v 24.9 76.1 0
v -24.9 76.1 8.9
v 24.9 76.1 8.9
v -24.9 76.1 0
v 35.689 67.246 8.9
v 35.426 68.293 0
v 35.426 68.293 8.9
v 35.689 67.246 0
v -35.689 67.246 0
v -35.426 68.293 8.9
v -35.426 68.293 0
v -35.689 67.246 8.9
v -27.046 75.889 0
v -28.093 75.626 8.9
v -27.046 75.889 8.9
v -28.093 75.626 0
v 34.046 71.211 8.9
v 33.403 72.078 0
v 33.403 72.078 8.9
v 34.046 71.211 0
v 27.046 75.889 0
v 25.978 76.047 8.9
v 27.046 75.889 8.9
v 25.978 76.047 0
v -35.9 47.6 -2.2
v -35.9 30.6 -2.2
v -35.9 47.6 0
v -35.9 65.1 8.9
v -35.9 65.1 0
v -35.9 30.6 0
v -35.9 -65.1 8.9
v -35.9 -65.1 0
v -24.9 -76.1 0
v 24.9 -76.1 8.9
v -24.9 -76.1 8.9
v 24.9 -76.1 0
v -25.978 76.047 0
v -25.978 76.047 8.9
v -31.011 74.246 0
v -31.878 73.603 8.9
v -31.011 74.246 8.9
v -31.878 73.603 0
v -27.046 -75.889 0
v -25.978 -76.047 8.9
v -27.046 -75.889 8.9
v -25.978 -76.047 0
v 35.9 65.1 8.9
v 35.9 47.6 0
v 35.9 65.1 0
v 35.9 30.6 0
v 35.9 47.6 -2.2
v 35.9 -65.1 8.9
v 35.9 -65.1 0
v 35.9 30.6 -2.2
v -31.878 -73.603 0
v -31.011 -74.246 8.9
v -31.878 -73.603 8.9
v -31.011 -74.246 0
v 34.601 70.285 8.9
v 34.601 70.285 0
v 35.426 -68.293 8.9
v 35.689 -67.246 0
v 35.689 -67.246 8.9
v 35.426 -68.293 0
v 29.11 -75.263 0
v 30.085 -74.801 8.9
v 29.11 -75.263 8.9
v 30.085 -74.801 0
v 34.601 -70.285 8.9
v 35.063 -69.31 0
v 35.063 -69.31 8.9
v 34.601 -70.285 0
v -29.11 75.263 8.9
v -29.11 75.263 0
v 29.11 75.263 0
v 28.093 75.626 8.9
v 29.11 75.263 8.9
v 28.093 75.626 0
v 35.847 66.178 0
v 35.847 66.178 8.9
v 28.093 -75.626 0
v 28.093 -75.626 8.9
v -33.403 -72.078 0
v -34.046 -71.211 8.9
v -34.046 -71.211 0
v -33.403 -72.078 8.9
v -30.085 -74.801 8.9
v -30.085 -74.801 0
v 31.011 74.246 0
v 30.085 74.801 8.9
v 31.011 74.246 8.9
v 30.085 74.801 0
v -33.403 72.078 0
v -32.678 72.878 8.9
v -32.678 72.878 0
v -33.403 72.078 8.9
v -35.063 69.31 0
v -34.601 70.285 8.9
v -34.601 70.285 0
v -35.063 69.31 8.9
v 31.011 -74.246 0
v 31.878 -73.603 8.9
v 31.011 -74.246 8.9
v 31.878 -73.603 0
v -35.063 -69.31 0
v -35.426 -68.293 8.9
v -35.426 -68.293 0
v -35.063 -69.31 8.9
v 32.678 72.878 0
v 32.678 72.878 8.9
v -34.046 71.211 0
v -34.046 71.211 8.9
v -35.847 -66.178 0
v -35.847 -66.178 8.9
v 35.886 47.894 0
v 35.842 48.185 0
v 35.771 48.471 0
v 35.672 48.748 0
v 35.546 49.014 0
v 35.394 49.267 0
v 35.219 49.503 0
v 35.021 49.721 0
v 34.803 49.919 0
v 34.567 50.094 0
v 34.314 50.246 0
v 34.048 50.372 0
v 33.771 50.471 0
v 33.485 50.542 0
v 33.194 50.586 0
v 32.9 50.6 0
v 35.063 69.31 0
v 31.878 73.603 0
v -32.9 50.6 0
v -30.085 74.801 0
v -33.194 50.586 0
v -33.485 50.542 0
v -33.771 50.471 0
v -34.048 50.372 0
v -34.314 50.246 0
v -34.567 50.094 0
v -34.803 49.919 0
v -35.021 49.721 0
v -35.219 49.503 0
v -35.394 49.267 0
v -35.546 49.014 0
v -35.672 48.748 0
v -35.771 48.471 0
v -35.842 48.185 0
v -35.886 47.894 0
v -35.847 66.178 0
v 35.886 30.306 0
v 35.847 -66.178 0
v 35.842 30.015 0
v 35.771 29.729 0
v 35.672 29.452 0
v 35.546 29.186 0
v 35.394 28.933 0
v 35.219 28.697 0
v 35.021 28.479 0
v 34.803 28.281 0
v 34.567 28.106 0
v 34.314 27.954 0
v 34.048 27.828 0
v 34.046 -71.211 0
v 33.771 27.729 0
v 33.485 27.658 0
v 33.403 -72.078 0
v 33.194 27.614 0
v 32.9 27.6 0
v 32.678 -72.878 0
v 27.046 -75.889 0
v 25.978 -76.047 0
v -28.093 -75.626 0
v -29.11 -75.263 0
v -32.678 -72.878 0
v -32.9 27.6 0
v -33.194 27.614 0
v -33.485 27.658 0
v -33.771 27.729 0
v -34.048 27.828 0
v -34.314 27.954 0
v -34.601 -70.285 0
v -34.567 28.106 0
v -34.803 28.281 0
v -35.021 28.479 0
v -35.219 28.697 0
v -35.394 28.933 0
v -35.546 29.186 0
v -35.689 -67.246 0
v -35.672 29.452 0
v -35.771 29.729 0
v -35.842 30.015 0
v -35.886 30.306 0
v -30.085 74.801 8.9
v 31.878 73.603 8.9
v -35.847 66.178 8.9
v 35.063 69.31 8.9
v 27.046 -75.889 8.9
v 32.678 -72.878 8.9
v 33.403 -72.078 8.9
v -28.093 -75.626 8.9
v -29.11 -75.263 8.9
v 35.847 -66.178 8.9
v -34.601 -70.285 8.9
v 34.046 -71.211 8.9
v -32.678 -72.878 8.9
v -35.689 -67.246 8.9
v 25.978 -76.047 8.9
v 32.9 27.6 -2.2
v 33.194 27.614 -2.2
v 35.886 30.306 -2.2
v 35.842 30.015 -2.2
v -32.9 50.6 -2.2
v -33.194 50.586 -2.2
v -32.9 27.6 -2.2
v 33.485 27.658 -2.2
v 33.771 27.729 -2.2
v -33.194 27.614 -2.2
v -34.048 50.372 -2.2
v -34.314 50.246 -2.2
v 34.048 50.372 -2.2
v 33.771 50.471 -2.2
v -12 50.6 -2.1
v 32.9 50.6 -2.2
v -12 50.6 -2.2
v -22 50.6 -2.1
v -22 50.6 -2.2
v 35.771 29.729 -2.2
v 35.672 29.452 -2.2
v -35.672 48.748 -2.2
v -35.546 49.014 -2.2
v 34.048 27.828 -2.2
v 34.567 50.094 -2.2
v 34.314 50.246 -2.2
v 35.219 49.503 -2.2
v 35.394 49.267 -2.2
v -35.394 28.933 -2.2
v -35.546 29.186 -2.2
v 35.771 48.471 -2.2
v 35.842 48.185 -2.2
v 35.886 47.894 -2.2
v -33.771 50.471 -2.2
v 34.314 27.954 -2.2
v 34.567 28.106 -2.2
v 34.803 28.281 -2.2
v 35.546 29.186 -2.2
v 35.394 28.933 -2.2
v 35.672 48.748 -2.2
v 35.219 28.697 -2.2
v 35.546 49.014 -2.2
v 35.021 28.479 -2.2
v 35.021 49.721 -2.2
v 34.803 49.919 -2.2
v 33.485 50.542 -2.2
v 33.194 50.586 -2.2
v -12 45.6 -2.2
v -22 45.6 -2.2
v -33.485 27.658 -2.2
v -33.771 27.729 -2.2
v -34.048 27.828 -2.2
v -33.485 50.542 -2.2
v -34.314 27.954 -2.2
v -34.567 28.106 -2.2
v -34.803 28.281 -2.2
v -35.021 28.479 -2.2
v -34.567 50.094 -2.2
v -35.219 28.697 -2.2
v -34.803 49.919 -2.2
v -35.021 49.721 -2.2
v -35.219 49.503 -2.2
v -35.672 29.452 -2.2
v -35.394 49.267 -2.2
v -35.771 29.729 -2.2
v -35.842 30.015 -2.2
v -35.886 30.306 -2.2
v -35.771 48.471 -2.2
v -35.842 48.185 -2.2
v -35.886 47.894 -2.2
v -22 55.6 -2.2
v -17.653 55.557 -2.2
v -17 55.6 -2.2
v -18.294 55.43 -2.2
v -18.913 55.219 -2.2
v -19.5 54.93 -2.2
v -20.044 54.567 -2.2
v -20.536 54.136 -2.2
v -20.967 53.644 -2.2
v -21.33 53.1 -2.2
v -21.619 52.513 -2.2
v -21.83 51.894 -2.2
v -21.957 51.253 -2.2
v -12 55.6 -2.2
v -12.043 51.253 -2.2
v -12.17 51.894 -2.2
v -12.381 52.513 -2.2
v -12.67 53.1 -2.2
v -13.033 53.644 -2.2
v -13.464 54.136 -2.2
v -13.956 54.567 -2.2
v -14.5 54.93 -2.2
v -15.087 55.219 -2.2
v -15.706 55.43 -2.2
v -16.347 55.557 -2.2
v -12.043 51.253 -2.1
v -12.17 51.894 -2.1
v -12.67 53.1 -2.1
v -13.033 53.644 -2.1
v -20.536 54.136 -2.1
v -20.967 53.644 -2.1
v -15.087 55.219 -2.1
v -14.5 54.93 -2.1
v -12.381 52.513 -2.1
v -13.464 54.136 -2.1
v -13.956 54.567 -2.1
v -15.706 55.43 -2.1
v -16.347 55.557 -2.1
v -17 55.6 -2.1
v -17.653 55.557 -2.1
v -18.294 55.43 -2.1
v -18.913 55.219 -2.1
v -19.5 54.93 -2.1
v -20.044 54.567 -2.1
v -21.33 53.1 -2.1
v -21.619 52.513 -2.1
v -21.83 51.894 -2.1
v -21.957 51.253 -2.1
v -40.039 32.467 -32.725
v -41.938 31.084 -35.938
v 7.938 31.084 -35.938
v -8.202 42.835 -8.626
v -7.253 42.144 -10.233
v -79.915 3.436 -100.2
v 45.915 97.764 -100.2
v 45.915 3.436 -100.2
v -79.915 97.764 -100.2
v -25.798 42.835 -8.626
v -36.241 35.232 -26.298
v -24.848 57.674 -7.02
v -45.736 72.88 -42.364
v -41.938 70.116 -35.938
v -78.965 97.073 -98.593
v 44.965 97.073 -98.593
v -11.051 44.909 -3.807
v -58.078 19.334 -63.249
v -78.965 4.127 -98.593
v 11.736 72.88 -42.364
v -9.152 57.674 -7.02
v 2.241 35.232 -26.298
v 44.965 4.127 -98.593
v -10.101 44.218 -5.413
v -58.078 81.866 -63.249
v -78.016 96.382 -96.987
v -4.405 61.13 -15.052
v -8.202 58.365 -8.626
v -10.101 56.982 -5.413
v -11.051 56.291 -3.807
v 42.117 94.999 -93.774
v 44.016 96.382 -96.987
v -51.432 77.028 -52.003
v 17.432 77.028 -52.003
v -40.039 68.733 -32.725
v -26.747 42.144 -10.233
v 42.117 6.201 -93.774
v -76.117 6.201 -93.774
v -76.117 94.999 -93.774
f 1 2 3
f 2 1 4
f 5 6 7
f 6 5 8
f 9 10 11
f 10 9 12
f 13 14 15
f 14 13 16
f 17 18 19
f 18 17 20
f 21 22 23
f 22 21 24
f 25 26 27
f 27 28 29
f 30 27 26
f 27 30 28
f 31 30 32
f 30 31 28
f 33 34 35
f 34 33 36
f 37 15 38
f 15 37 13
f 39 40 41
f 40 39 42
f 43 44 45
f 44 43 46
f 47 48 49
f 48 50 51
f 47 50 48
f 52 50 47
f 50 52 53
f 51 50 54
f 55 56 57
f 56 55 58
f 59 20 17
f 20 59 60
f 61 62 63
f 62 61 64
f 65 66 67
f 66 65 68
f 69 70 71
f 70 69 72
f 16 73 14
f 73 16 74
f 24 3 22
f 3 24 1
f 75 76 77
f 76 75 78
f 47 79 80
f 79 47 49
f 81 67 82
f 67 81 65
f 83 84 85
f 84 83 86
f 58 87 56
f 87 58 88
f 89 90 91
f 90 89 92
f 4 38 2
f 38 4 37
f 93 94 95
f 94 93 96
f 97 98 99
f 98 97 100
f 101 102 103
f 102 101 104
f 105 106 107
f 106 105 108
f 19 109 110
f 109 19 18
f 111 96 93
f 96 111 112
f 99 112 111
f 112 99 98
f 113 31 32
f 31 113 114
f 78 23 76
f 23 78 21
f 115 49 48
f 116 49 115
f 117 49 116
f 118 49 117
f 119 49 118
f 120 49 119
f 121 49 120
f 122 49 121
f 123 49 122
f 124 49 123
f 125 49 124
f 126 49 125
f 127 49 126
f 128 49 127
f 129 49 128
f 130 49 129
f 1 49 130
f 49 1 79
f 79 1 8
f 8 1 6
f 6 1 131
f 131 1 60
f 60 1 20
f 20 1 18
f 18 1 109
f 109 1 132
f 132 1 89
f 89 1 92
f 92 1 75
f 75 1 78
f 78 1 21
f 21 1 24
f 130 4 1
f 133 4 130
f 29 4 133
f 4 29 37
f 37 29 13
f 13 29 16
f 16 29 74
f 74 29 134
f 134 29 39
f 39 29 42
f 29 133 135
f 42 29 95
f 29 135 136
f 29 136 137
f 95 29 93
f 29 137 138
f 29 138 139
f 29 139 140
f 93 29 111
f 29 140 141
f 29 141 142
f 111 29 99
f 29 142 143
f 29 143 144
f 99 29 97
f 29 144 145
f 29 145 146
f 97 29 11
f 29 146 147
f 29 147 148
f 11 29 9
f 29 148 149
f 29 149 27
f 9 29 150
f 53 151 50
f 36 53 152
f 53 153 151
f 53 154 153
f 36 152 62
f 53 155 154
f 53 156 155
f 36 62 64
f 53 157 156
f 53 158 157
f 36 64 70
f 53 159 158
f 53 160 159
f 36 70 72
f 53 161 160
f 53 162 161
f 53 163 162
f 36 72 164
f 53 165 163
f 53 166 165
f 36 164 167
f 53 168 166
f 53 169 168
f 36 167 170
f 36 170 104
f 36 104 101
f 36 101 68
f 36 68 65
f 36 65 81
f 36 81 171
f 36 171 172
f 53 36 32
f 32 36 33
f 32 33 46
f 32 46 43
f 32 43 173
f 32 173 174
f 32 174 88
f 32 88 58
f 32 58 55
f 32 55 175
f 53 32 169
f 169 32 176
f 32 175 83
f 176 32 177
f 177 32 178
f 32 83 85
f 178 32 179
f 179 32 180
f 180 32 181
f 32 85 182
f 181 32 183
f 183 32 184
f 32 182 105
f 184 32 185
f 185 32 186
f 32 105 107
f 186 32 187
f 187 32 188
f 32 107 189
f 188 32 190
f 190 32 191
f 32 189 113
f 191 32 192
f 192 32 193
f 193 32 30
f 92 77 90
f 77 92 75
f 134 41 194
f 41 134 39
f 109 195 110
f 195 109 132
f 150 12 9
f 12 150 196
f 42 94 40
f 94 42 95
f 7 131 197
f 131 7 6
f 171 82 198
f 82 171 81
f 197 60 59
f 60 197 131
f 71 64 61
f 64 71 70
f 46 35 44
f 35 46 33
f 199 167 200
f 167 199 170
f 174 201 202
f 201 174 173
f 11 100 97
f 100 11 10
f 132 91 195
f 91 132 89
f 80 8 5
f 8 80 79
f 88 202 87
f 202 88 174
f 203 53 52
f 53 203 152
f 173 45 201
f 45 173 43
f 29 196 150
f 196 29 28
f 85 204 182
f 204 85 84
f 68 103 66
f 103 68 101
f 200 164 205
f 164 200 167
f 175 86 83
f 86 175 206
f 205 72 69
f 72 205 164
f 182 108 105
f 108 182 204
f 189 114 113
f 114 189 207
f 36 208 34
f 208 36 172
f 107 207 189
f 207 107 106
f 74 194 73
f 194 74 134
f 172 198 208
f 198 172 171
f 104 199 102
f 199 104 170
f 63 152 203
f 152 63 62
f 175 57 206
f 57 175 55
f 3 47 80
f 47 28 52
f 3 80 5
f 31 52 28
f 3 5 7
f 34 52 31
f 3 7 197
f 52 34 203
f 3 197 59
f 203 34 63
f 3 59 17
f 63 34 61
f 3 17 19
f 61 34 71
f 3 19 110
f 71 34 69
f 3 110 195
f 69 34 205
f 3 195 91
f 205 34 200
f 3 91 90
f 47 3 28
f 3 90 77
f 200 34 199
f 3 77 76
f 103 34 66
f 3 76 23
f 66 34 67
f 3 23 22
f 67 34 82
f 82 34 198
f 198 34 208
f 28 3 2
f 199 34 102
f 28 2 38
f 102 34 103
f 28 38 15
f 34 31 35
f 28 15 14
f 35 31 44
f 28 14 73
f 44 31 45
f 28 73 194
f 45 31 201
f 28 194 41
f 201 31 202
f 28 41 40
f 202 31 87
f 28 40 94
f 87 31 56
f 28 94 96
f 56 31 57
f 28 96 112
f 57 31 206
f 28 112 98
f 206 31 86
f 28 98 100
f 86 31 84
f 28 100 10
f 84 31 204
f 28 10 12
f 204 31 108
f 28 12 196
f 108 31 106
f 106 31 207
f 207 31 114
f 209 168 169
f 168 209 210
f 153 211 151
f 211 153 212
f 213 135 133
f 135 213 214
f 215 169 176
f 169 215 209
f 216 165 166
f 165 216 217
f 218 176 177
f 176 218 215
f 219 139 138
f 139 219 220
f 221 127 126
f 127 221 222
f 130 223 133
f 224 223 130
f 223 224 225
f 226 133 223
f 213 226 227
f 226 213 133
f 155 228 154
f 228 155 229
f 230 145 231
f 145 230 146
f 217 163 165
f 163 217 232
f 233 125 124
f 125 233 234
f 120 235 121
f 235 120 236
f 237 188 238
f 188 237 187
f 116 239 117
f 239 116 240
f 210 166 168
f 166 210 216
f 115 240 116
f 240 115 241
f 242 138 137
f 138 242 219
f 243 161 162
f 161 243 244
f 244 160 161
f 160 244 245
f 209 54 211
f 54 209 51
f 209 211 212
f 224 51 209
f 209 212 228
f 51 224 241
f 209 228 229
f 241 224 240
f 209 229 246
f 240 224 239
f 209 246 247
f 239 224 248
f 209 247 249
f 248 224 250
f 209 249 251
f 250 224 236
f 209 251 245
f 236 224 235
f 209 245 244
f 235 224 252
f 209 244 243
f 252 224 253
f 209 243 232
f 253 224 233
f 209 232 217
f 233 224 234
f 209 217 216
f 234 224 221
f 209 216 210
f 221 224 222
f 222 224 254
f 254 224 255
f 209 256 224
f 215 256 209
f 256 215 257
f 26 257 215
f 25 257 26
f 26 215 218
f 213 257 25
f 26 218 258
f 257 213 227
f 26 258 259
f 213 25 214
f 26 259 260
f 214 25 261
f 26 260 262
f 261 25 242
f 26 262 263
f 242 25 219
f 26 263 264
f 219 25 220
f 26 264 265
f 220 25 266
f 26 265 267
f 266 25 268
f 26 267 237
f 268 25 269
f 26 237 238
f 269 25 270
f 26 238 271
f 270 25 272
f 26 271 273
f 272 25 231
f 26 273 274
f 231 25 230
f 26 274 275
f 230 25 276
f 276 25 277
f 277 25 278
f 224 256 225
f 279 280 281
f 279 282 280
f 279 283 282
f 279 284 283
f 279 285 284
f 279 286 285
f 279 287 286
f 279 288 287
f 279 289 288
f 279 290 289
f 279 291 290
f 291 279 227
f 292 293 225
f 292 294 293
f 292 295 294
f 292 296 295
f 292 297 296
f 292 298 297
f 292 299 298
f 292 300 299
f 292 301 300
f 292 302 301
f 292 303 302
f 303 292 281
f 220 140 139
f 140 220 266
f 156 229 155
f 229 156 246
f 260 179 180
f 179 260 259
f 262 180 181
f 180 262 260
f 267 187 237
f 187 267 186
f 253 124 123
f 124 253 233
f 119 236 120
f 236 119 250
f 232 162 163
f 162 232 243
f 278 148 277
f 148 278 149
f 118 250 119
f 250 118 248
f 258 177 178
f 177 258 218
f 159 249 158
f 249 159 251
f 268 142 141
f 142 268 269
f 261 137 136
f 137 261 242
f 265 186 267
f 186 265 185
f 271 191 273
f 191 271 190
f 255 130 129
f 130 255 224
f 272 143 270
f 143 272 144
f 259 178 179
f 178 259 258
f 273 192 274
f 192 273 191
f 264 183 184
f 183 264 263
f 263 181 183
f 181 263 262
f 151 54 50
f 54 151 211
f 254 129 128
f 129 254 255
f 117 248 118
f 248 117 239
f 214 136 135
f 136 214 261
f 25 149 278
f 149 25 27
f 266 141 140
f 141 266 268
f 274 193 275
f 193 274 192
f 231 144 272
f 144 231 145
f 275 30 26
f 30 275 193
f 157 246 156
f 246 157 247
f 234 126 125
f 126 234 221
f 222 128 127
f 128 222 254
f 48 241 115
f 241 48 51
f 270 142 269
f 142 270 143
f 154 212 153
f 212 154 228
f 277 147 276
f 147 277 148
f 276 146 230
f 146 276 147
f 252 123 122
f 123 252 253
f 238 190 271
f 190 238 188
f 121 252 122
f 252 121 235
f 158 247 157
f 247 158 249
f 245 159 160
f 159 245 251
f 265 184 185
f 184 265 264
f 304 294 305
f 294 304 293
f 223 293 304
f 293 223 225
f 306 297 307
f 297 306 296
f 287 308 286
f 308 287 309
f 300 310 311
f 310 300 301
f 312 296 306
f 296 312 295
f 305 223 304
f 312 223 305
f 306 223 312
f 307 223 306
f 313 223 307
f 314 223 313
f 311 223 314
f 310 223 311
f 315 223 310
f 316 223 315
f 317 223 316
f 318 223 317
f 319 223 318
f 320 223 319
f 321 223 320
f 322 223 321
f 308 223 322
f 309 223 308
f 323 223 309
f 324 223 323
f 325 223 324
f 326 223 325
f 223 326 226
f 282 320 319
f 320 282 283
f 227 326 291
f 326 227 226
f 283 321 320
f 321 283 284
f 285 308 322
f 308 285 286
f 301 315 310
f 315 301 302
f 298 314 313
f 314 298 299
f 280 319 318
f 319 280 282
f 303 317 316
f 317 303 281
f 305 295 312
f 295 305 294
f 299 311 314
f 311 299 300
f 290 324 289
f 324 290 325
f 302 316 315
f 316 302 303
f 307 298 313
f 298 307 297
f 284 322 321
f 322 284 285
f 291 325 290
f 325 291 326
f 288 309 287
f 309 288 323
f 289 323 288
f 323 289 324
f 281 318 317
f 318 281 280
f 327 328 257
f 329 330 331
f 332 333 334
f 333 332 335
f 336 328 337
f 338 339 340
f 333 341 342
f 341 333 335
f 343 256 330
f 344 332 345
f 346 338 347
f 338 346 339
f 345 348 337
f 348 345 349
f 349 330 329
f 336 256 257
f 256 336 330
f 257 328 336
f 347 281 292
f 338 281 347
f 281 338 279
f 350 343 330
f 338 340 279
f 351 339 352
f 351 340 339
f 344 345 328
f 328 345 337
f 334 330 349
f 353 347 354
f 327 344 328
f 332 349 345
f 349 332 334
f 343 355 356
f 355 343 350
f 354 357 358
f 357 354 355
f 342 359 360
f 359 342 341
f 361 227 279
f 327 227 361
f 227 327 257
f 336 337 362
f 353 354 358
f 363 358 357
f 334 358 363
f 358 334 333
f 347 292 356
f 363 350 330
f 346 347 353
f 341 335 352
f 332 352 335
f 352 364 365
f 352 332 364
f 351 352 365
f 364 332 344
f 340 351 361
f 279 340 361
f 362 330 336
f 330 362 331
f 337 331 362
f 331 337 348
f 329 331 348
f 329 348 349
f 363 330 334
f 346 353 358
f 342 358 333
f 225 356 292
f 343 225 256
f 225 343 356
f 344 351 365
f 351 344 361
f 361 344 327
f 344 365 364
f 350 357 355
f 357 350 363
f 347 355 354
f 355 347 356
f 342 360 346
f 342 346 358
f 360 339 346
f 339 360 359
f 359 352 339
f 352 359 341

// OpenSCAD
// pixel6a.scad — reference solid + parameters for the XYZ Arm Mk1 phone cradle.
//
// COORDINATE SYSTEM (matches the rig):
//   origin = centre of the phone's BACK face
//   +X = across the phone (width)
//   +Y = toward the TOP of the phone (the camera-bar end)
//   +Z = up into the body, so the screen is at Z = +body_t
//   The camera bar protrudes into -Z, i.e. DOWNWARD toward the mat.
//
// Values are tagged:
//   [SPEC]    published, trust it
//   [MEASURE] not published anywhere reliable — caliper the actual phone
//             before cutting. Placeholders below are eyeballed from photos
//             and WILL be a millimetre or two out.

/* ---------------- body ---------------- */
body_l      = 152.2;   // [SPEC] length, Y
body_w      =  71.8;   // [SPEC] width, X
body_t      =   8.9;   // [SPEC] thickness, Z (excludes camera bar)
body_mass_g = 178;     // [SPEC]
corner_r    =  11.0;   // [MEASURE] plan-view corner radius
edge_r      =   2.0;   // [MEASURE] rail edge break

/* ---------------- camera bar ----------------
   Full-width raised bar near the top of the back. Because it spans the whole
   width it is a natural registration datum — register the cradle off the BAR,
   not off the back face, which the bar holds off any flat surface anyway. */
bar_from_top   = 14.0; // [MEASURE] top edge of phone -> top edge of bar
bar_h          = 23.0; // [MEASURE] bar extent along Y
bar_z          =  2.2; // [MEASURE] protrusion below the back face
bar_r          =  3.0; // [MEASURE] bar fillet

/* ---------------- main camera ----------------
   12.2 MP, f/1.7, 1/2.55", 1.4 um pixels, 4032 x 3024, OIS.
   Lens centre offsets are [MEASURE] — take them from the bar's own edges. */
cam_x        = -17.0;  // [MEASURE] lens centre, X from phone centreline
cam_y_in_bar =  11.5;  // [MEASURE] lens centre, Y down from bar top edge
cam_lens_d   =  10.0;  // [MEASURE] outer glass diameter

cam_y = body_l/2 - bar_from_top - cam_y_in_bar;   // derived, phone coords

/* ---------------- optics (derived from [SPEC] sensor data) ----------------
   sensor 5.645 x 4.234 mm, f = 4.40 mm  ->  65.4 deg H, 51.4 deg V
   frame width  = 1.283 * height
   frame height = 0.962 * height
   closest focus 98 mm  ->  126 mm wide, 31 um/px                */
fov_h        = 65.4;
fov_v        = 51.4;
focus_min    = 98;

/* ---------------- keep-outs ---------------- */
// Buttons are on the +X side (right, viewed from the screen): power above the
// volume rocker. A cradle that grips both long edges WILL hold them down —
// relieve this window or the phone sleeps, screenshots and changes volume.
btn_side      = +1;    // +X
btn_from_top  = 34.0;  // [MEASURE] top of phone -> top of power button
btn_span      = 46.0;  // [MEASURE] power top -> volume bottom
btn_relief    =  2.5;  // clearance to leave around the window

usb_from_bot  =  0;    // USB-C, bottom edge centre
mag_keepout   = 100;   // mm from the lens — OIS and the VCM focus actuator are
                       // magnet-driven; keep the Olight's tailcap outside this.

/* ---------------- reference solid ---------------- */
module rrect(l, w, t, r) {
    hull() for (sx = [-1, 1], sy = [-1, 1])
        translate([sx * (w/2 - r), sy * (l/2 - r), 0])
            cylinder(h = t, r = r, $fn = 64);
}

module pixel6a(show_cone = false) {
    color("#3a3f45") {
        rrect(body_l, body_w, body_t, corner_r);           // body
        translate([0, body_l/2 - bar_from_top - bar_h, -bar_z])
            rrect(bar_h, body_w, bar_z + 0.01, bar_r);     // camera bar
    }
    color("#111") translate([cam_x, cam_y, -bar_z - 0.2])
        cylinder(h = 0.3, d = cam_lens_d, $fn = 48);       // main lens

    // the volume the cradle must not enter
    if (show_cone)
        translate([cam_x, cam_y, -bar_z])
            color("#d08a2a", 0.25)
                mirror([0, 0, 1])
                    linear_extrude(height = focus_min, scale = [
                        2 * focus_min * tan(fov_h/2) / cam_lens_d,
                        2 * focus_min * tan(fov_v/2) / cam_lens_d])
                        square([cam_lens_d, cam_lens_d], center = true);
}

/* ---------------- cradle constraints, for whoever models it ----------------
   1. Open U. Grip the two long edges only; leave the entire back face clear.
      No shelf under the camera bar.
   2. Relieve the button window on +X (see btn_* above).
   3. Leave a flat contact patch on the back face, below the bar, for a thermal
      pad to the extrusion — it is the heatsink path. Do not cover the bar.
   4. Nothing may enter the cone from the main lens (show_cone = true).
   5. Screen faces +Z, up. It stays readable and tappable in the rig.
   6. Phone long axis runs ALONG the gantry.                                  */

pixel6a(show_cone = true);
